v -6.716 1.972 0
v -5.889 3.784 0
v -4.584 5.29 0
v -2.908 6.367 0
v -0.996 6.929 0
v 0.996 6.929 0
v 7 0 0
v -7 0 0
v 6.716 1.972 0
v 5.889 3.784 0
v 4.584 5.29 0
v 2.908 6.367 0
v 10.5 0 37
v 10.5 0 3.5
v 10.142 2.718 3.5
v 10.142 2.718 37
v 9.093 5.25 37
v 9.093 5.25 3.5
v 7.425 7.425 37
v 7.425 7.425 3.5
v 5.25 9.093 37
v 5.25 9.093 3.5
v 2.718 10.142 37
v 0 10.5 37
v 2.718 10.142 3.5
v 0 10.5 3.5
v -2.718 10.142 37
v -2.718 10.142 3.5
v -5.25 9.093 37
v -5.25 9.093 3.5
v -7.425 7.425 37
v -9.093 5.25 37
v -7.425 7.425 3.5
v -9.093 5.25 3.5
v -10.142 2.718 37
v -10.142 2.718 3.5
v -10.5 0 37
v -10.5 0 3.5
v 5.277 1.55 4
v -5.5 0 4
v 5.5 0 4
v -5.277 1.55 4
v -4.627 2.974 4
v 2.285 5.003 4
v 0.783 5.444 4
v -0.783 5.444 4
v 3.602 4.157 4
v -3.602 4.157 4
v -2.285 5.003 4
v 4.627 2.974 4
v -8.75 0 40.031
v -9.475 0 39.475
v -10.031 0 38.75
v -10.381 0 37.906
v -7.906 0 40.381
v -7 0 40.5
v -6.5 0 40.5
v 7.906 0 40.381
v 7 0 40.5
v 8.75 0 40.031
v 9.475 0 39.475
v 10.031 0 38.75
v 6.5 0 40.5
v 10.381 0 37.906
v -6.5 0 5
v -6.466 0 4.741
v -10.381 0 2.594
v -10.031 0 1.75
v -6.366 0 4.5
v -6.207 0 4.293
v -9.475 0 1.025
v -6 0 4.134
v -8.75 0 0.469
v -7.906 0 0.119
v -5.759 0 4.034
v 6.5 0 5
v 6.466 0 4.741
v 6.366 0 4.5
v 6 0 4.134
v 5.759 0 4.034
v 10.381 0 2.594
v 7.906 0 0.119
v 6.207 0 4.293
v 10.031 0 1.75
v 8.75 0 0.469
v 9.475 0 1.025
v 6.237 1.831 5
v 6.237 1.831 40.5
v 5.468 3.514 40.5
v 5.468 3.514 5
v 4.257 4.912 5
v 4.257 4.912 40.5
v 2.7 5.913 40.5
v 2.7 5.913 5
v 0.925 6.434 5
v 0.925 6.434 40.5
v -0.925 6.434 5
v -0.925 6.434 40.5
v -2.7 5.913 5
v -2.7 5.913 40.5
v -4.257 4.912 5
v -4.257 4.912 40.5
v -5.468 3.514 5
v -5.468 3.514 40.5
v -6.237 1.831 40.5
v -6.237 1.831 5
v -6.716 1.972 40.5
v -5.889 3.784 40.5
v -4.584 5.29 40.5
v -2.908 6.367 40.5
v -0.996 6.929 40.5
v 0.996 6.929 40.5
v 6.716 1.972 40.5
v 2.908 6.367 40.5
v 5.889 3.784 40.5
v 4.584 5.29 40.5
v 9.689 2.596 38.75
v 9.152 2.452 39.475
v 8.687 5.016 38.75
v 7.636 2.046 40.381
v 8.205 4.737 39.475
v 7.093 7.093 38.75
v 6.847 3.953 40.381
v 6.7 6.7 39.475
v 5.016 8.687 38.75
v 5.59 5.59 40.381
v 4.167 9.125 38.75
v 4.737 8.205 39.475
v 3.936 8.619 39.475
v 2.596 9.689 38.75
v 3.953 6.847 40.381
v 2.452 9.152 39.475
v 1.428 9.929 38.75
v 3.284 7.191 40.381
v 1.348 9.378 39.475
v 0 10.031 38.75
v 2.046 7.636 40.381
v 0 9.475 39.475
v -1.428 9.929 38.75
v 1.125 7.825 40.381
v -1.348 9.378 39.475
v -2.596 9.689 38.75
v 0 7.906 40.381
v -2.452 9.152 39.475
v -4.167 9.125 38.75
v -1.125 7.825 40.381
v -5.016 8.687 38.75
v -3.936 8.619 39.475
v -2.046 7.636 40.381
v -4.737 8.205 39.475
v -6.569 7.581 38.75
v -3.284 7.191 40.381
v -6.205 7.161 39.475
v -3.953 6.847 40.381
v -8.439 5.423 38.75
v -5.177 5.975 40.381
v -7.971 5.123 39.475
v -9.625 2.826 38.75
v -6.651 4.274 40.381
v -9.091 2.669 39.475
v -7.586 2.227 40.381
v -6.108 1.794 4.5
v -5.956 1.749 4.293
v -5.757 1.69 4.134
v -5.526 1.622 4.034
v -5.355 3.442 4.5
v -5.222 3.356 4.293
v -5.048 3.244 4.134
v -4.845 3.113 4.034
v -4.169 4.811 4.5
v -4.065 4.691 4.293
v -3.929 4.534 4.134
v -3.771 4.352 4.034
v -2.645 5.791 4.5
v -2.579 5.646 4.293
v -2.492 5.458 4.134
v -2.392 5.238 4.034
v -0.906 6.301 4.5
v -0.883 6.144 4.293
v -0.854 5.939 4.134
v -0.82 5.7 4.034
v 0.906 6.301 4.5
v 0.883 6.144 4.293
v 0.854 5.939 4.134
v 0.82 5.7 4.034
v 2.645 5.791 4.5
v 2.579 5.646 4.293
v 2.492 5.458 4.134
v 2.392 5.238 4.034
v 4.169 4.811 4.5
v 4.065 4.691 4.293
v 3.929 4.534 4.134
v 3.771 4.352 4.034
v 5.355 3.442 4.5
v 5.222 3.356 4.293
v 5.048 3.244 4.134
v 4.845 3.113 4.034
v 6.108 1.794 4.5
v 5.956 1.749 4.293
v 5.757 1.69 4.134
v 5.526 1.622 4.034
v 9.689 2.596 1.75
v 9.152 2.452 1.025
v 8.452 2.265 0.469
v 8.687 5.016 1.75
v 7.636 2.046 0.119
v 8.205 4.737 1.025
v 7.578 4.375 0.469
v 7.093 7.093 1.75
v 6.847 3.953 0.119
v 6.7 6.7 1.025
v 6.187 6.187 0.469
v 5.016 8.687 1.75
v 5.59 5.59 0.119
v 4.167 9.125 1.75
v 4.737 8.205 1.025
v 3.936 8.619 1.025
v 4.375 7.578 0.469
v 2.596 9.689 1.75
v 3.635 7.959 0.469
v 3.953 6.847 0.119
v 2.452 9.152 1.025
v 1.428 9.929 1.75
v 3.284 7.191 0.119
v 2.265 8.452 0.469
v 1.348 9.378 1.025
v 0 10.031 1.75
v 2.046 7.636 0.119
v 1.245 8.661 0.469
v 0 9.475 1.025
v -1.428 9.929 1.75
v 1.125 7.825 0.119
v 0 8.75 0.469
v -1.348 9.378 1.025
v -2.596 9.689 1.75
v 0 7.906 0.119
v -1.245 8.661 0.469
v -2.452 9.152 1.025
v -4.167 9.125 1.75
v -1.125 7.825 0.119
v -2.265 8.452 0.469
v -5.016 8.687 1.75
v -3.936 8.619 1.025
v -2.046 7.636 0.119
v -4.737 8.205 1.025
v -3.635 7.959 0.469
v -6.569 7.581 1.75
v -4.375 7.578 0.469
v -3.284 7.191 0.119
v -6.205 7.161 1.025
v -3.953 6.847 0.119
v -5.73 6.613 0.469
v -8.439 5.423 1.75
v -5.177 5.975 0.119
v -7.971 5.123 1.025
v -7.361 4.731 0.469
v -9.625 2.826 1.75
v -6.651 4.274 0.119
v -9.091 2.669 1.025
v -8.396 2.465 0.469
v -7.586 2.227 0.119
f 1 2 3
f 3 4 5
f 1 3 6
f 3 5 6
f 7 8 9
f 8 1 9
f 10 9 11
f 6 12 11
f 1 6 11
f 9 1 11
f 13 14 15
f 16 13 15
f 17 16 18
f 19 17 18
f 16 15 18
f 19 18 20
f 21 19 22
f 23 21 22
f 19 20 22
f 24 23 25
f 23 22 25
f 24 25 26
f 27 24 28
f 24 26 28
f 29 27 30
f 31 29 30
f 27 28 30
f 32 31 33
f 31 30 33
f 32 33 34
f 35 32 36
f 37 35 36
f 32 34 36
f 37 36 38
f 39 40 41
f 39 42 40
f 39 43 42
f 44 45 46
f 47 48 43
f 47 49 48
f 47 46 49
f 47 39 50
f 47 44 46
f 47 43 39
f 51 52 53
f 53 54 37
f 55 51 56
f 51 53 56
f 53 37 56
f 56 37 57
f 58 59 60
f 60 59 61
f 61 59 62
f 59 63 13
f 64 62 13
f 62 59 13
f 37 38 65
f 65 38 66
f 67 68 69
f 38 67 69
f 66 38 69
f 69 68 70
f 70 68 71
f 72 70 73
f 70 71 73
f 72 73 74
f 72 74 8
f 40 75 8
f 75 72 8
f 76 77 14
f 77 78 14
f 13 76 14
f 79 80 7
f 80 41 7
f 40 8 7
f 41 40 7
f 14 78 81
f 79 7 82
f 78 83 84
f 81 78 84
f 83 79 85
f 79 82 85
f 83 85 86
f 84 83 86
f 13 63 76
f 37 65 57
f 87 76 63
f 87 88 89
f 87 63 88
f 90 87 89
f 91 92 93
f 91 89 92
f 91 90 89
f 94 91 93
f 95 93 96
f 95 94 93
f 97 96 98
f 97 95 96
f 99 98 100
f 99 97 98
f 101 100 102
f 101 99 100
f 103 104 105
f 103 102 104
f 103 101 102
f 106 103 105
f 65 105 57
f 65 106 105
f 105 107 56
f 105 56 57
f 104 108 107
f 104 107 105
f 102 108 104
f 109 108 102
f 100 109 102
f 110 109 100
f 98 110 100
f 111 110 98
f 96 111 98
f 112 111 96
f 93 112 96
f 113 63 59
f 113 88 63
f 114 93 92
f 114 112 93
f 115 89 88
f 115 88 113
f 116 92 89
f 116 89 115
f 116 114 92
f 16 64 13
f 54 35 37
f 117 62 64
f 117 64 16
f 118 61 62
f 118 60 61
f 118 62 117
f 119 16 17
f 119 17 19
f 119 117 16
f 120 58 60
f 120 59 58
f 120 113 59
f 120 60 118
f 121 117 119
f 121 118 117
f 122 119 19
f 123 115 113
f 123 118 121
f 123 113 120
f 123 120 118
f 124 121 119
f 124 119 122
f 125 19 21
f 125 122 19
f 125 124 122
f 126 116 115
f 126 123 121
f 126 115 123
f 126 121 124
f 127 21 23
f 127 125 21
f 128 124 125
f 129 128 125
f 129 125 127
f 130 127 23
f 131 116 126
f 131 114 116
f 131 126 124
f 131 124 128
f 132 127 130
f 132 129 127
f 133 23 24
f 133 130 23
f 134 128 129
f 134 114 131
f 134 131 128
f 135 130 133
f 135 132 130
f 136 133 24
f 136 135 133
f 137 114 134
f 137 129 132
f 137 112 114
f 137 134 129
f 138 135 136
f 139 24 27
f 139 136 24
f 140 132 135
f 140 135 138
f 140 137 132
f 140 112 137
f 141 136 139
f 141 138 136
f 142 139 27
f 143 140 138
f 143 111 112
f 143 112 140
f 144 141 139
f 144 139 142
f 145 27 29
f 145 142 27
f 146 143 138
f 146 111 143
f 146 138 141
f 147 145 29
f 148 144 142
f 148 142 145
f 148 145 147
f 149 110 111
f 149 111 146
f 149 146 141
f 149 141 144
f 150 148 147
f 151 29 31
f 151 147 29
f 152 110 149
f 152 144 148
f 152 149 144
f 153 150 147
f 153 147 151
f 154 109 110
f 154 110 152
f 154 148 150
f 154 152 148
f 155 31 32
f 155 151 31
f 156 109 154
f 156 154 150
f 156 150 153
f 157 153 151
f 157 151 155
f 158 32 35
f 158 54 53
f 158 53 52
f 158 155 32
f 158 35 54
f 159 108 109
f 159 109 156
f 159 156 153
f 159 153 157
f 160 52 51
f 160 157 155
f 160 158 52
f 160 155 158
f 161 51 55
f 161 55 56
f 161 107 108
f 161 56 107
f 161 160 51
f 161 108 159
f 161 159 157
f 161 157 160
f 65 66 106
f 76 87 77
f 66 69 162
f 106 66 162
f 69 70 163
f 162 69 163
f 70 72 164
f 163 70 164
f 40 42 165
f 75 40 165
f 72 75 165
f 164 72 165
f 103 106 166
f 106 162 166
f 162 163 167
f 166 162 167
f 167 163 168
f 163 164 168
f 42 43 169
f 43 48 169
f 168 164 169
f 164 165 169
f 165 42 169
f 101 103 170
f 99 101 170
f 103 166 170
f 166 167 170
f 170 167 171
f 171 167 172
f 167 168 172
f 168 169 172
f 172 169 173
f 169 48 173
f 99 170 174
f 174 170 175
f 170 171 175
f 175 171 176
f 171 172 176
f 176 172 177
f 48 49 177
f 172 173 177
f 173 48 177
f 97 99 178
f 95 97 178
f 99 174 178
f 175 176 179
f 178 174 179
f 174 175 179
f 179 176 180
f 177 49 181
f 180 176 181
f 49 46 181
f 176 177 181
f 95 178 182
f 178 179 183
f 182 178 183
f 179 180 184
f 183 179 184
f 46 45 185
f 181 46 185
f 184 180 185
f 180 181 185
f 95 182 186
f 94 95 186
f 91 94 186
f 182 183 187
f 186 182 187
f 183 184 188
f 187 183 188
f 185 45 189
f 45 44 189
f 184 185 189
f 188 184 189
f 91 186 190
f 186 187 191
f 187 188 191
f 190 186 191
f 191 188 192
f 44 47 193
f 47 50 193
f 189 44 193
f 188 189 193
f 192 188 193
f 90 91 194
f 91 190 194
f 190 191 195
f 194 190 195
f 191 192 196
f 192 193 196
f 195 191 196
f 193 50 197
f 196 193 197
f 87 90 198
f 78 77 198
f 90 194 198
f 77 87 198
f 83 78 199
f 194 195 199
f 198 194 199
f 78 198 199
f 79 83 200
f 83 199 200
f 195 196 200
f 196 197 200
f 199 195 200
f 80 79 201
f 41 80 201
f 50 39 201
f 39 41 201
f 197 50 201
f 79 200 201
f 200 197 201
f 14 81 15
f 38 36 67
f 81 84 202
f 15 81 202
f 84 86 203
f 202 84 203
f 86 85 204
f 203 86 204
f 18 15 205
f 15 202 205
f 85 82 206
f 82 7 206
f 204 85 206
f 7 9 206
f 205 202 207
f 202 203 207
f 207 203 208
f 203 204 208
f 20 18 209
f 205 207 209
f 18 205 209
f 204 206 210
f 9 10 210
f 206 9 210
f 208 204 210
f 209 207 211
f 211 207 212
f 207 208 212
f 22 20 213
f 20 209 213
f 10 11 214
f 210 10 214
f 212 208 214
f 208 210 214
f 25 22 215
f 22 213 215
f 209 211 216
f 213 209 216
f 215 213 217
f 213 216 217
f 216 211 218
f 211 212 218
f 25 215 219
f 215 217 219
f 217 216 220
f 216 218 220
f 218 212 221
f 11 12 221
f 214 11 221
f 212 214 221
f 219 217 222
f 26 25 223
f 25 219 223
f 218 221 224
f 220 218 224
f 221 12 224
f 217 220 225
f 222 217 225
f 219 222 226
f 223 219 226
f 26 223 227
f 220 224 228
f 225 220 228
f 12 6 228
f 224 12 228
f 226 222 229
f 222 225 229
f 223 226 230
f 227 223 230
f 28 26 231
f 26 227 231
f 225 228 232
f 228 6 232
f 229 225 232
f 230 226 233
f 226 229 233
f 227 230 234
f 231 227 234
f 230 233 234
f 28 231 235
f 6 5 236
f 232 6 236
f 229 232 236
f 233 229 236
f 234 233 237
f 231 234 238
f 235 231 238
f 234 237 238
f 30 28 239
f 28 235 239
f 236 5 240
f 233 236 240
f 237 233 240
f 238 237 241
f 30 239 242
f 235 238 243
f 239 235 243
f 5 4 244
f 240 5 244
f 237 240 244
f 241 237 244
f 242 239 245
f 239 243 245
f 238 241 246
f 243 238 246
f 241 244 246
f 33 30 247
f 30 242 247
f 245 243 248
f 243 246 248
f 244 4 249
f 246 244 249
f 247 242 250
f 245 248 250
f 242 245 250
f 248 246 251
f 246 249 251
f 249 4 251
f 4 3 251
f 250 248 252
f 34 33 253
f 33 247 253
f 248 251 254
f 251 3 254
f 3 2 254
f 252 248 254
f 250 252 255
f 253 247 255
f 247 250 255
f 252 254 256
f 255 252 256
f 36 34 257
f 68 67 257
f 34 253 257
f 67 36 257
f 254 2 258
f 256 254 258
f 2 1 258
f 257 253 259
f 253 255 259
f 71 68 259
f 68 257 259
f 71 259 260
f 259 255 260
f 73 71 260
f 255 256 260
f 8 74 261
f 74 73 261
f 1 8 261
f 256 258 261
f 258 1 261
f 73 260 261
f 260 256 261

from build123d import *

# Parameters (mm, degrees)
SKETCH1_R           = 10.5
BOSS_EXTRUDE1_DEPTH = 40.5
SHELL1_T            = -4
FILLET1_R           = 3.5
FILLET2_R           = 3.5
FILLET3_R           = 1
SKETCH2_W           = 37.590072207
SKETCH2_H           = 54.748834579
CUT_EXTRUDE1_DEPTH  = 40.5


with BuildPart() as part:
    # Sketch1 → Boss-Extrude1 (new body)
    with BuildSketch(Plane.XY):
        Circle(SKETCH1_R)
    extrude(amount=BOSS_EXTRUDE1_DEPTH)

    # Shell1
    shell1_openings = [part.faces().sort_by_distance(p)[0] for p in [
        (0, 0, 40.5),
    ]]
    offset(amount=SHELL1_T, openings=shell1_openings, kind=Kind.INTERSECTION)

    # Fillet1
    fillet1_edges = [part.edges().sort_by_distance(p)[0] for p in [
        (-10.5, 0, 40.5),
    ]]
    fillet(fillet1_edges, radius=FILLET1_R)

    # Fillet2
    fillet2_edges = [part.edges().sort_by_distance(p)[0] for p in [
        (-10.5, 0, 0),
    ]]
    fillet(fillet2_edges, radius=FILLET2_R)

    # Fillet3
    fillet3_edges = [part.edges().sort_by_distance(p)[0] for p in [
        (-6.5, 0, 4),
    ]]
    fillet(fillet3_edges, radius=FILLET3_R)

    # Sketch2 → Cut-Extrude1 (cut)
    with BuildSketch(Plane(origin=(0, 0, 0), x_dir=(1, 0, 0), z_dir=(0, 1, 0))):
        with Locations((0.840248673, -18.259937353)):
            Rectangle(SKETCH2_W, SKETCH2_H)
    extrude(amount=-CUT_EXTRUDE1_DEPTH, mode=Mode.SUBTRACT)


solid = part.part
